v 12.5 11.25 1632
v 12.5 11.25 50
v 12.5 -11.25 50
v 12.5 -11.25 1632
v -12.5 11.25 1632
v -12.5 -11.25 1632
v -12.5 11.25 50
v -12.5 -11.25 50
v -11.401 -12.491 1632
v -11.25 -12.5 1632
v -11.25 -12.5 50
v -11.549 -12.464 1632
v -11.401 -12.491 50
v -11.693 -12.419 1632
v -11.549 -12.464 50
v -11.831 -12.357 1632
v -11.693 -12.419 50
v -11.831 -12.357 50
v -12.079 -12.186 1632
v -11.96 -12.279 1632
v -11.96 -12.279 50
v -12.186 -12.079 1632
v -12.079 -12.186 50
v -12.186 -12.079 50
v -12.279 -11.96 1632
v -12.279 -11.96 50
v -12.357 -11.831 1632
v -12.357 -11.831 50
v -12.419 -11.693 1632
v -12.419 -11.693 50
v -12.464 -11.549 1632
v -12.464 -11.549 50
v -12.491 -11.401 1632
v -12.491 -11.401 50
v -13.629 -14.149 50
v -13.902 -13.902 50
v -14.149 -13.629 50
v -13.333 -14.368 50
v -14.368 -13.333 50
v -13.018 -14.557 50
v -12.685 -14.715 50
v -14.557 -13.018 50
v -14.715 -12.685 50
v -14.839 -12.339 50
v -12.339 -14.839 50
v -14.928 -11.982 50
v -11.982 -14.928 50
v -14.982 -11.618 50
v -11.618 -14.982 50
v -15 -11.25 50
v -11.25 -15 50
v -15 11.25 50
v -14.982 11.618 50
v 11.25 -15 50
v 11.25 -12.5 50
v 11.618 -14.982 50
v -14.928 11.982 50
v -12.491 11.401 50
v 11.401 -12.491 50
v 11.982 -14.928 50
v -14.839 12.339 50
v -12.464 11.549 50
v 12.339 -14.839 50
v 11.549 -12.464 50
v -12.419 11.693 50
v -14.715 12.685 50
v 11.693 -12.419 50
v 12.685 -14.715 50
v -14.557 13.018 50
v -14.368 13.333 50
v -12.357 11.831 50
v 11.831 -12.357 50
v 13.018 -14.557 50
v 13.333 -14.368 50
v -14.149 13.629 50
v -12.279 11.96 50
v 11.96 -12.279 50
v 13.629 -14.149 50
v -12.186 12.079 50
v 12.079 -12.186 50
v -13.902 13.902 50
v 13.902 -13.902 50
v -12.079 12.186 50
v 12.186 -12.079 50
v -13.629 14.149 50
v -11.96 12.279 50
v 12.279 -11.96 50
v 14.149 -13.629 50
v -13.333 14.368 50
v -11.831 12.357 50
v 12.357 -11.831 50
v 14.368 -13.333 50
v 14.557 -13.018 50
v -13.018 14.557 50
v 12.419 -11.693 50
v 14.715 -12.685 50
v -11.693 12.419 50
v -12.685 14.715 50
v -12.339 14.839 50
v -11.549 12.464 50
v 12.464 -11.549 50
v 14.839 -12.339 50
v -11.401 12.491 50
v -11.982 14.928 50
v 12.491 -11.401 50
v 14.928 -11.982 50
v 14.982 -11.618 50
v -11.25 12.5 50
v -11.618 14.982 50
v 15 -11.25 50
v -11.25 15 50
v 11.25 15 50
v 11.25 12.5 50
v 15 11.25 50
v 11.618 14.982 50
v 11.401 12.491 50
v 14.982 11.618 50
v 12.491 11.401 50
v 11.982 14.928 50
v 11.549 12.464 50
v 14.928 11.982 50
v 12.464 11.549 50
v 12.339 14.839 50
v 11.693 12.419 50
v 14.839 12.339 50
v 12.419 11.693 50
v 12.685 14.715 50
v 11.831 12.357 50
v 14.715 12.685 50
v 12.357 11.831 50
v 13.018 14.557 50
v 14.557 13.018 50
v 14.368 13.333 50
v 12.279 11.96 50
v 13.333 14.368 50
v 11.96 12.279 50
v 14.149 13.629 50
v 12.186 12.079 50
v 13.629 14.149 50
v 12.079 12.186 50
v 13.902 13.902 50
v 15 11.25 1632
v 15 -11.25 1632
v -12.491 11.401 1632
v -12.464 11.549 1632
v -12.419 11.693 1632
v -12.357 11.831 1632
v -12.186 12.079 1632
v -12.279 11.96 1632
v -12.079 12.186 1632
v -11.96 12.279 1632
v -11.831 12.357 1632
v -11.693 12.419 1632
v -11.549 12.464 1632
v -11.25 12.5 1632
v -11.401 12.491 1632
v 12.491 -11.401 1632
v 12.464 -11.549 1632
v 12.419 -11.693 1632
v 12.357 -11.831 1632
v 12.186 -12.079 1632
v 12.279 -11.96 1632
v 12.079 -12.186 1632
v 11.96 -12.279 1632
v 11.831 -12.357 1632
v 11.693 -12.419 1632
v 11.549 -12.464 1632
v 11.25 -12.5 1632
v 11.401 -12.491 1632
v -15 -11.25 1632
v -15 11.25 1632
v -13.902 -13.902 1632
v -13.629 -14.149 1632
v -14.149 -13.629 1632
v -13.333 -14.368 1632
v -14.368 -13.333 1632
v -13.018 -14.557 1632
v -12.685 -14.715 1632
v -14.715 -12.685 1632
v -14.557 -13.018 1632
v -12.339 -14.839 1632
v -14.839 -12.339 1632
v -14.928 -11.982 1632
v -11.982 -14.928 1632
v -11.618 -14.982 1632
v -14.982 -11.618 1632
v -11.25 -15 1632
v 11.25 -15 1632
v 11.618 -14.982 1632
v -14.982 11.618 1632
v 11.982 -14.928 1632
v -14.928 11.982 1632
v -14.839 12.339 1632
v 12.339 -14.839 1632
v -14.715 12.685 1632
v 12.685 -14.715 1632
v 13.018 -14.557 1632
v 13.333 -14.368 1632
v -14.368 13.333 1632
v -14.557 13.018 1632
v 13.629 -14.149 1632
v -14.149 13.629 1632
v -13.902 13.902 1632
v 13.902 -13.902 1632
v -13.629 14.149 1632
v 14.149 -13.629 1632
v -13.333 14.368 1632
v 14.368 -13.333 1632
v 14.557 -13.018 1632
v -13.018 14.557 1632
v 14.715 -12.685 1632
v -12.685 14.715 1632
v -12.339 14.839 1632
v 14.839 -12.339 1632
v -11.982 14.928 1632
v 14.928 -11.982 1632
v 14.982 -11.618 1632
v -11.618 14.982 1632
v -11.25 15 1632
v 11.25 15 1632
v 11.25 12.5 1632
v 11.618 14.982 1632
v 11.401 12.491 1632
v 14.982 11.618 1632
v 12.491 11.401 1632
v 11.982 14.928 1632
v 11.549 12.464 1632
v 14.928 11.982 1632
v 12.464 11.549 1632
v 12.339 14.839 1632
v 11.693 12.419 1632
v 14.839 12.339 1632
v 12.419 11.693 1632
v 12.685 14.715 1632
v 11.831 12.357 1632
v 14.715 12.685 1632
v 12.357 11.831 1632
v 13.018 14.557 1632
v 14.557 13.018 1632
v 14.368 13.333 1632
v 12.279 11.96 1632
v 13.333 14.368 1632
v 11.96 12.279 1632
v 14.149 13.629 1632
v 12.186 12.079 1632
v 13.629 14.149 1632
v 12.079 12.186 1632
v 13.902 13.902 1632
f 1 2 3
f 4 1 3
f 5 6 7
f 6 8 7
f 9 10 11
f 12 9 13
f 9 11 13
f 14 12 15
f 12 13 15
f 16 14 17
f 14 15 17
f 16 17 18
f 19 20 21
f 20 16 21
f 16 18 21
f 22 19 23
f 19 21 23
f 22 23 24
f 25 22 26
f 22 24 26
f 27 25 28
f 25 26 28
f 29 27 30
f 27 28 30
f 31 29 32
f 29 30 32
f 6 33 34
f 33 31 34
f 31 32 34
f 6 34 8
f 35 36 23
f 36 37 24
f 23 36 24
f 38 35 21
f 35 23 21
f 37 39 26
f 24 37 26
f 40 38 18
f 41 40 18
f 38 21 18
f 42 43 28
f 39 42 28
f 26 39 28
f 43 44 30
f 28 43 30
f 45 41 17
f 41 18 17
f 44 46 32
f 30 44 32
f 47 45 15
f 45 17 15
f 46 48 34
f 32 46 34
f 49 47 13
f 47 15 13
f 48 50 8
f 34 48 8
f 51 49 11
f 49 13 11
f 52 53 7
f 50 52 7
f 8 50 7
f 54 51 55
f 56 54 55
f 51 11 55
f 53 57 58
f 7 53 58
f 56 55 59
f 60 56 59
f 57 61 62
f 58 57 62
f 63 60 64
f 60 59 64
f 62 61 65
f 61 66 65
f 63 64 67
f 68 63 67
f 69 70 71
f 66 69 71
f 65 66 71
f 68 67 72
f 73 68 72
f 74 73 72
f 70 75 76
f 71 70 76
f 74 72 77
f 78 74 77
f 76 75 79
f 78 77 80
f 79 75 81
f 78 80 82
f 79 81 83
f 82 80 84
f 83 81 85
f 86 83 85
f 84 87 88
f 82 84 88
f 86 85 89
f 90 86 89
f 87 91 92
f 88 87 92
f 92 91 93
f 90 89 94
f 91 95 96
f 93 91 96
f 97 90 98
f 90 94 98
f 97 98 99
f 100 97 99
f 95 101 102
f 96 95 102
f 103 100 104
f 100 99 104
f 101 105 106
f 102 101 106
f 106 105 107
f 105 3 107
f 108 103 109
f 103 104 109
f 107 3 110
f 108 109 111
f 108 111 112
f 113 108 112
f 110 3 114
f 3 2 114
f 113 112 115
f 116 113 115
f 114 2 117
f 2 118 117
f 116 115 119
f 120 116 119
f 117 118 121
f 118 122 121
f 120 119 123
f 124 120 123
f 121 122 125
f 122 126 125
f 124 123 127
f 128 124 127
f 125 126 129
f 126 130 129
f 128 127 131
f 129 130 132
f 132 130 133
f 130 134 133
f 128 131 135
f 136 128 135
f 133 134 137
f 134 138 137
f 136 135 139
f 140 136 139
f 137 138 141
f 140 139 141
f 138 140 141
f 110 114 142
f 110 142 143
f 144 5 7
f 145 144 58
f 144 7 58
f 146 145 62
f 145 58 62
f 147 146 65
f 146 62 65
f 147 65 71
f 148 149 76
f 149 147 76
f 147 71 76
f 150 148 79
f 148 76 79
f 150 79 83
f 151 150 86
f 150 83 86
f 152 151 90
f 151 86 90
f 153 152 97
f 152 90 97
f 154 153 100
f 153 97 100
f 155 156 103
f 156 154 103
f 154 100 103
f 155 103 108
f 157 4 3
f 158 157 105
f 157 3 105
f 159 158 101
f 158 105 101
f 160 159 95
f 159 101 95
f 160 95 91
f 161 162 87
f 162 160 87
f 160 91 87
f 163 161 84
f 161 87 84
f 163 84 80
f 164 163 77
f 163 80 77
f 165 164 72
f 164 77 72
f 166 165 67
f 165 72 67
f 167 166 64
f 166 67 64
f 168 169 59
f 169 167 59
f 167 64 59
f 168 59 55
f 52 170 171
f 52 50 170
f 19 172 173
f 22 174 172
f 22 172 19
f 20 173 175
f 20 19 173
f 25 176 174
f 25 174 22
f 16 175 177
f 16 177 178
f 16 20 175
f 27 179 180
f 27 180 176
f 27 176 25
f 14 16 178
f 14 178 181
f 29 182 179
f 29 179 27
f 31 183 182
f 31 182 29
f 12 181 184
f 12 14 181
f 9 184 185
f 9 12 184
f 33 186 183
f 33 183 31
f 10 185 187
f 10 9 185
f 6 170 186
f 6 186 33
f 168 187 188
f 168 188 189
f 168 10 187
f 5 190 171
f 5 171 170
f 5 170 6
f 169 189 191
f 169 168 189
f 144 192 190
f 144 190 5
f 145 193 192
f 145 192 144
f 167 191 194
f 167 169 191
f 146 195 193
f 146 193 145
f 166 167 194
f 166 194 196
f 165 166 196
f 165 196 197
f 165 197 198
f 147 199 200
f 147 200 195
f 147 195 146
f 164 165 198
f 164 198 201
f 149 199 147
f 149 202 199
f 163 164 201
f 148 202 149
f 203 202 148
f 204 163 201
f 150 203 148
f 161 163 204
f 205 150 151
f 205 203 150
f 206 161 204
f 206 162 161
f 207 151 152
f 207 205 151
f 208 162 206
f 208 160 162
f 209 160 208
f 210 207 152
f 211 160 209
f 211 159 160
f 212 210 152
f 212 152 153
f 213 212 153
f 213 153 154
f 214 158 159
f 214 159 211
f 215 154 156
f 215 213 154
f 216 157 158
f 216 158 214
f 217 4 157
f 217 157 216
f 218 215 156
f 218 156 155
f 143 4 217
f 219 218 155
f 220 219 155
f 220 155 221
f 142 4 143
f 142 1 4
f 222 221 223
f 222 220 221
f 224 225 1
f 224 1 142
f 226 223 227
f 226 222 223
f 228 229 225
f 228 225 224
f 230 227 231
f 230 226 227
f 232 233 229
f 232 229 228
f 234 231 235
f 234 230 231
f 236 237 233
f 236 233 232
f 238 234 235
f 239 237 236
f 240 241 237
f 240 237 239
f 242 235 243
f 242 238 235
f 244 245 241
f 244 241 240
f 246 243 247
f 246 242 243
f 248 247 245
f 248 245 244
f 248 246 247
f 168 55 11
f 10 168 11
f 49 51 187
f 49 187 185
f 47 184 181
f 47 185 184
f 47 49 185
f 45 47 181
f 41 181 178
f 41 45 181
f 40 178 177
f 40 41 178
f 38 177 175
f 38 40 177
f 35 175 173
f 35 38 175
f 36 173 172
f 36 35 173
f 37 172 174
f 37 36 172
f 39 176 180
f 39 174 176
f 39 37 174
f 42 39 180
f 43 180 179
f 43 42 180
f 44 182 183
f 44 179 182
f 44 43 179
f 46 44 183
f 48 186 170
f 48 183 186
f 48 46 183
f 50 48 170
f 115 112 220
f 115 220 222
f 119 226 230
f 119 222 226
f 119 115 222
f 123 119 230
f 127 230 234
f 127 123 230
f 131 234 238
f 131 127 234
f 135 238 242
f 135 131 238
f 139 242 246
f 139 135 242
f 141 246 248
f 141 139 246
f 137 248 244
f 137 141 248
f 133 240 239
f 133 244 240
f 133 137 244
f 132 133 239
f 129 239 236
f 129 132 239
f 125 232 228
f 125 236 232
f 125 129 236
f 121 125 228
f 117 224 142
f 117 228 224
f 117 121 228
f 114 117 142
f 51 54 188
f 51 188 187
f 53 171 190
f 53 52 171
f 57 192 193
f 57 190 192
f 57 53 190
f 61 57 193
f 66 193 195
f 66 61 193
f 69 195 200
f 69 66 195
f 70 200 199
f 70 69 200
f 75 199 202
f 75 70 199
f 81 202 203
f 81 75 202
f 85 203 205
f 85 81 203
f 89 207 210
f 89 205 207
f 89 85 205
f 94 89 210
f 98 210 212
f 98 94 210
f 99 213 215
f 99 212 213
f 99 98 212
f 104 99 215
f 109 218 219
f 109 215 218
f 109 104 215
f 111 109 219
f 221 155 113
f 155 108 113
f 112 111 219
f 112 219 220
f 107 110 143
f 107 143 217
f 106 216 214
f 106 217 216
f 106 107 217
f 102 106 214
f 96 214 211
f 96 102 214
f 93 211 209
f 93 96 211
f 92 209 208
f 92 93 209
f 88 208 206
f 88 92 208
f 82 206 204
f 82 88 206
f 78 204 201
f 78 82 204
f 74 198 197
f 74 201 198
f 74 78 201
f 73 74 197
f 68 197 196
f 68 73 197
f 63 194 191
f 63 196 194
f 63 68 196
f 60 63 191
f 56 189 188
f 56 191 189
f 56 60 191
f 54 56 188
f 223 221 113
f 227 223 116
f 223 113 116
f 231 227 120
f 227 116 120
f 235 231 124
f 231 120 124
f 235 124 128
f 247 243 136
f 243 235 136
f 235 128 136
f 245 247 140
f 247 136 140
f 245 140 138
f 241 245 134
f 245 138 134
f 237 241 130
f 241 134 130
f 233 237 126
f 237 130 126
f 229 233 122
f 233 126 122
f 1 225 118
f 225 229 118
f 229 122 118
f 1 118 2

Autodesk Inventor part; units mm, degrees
ref_plane "Start plane" through (0, 0, 50) normal (0, 0, 1) x (1, 0, 0)
ref_plane "End plane" through (0, 0, 1632) normal (0, 0, 1) x (1, 0, 0)
sketch "Sketch" plane through (0, 0, 0) normal (0, 0, 1) x (1, 0, 0)
  line L0 (-15, -11.25) -> (-15, 11.25)
  line L1 (-11.25, 15) -> (11.25, 15)
  line L2 (15, 11.25) -> (15, -11.25)
  line L3 (11.25, -15) -> (-11.25, -15)
  arc A0 (-15, -11.25) -> (-11.25, -15) centre (-11.25, -11.25) ccw
  arc A1 (-11.25, 15) -> (-15, 11.25) centre (-11.25, 11.25) ccw
  arc A2 (15, 11.25) -> (11.25, 15) centre (11.25, 11.25) ccw
  arc A3 (11.25, -15) -> (15, -11.25) centre (11.25, -11.25) ccw
  arc A4 (-11.25, 12.5) -> (-12.5, 11.25) centre (-11.25, 11.25) ccw
  line L4 (-11.25, 12.5) -> (11.25, 12.5)
  arc A5 (12.5, 11.25) -> (11.25, 12.5) centre (11.25, 11.25) ccw
  line L5 (12.5, 11.25) -> (12.5, -11.25)
  arc A6 (11.25, -12.5) -> (12.5, -11.25) centre (11.25, -11.25) ccw
  line L6 (11.25, -12.5) -> (-11.25, -12.5)
  arc A7 (-12.5, -11.25) -> (-11.25, -12.5) centre (-11.25, -11.25) ccw
  line L7 (-12.5, -11.25) -> (-12.5, 11.25)
  line L8 (0, 22.0873) -> (0, -22.0873) construction
  line L9 (-22.0873, 0) -> (22.0873, 0) construction
  dimension "d7" = 3.75
  dimension "d10" = 30
  dimension "d11" = 30
  dimension "d12" = 2.5
  dimension "d15" = 15
  dimension "d16" = 15
extrude "Body" add sketch "Sketch" along normal up to surface (1582 mm away) from surface at 50
sketch "Sketch3" plane through (0, 0, 0) normal (0, 0, 1) x (1, 0, 0)
  line L0 (0, 0) -> (10, 0)
ref_plane "Work Plane3" through (0, 0, 0) normal (0, -1, 0) x (1, 0, 0)
sketch "Sketch4" plane through (0, 0, 0) normal (0, -1, 0) x (1, 0, 0)
  line L0 (-2, 50) -> (12, 50)
  line L1 (-2, 1632) -> (12, 1632)
  dimension "d18" = 1582
ref_plane "Work Plane4" through (9.2, 45, 1632) normal (0, 0, 1) x (1, 0, 0)
split "Split1" plane through (9.2, 45, 1632) removes the side toward (0, 0, 1)
ref_plane "Work Plane5" through (-629.2, 45, 50) normal (0, 0, -1) x (-1, 0, 0)
split "Split2" plane through (-629.2, 45, 50) removes the side toward (0, 0, -1)
ref_plane "Work Plane6" through (-630.2, -705, 1632) normal (0, 0, 1) x (1, 0, 0)
split "Split3" plane through (-630.2, -705, 1632) removes the side toward (0, 0, 1)
equation "\"d7\" = G_IR"
equation "\"d10\" = G_H"
equation "\"d11\" = G_W"
equation "\"d12\" = G_T"
equation "\"d15\" = 0.5 * d10"
equation "\"d16\" = 0.5 * d11"
equation "\"d3\" = G_L"
equation "\"G_W\" = 30"
equation "\"G_H\" = 30"
equation "\"G_T\" = 2.5"
equation "\"G_IR\" = 3.75"
equation "\"G_L\" = d18"
equation "\"d14\" = G_OFFSET_END + B_L"
equation "\"B_L\" = 1682"
equation "\"G_OFFSET_END\" = -50"
properties part number "DIN EN 10305-5 - 30 x 30 x 2,5  - 1582" material "Steel, Mild"
